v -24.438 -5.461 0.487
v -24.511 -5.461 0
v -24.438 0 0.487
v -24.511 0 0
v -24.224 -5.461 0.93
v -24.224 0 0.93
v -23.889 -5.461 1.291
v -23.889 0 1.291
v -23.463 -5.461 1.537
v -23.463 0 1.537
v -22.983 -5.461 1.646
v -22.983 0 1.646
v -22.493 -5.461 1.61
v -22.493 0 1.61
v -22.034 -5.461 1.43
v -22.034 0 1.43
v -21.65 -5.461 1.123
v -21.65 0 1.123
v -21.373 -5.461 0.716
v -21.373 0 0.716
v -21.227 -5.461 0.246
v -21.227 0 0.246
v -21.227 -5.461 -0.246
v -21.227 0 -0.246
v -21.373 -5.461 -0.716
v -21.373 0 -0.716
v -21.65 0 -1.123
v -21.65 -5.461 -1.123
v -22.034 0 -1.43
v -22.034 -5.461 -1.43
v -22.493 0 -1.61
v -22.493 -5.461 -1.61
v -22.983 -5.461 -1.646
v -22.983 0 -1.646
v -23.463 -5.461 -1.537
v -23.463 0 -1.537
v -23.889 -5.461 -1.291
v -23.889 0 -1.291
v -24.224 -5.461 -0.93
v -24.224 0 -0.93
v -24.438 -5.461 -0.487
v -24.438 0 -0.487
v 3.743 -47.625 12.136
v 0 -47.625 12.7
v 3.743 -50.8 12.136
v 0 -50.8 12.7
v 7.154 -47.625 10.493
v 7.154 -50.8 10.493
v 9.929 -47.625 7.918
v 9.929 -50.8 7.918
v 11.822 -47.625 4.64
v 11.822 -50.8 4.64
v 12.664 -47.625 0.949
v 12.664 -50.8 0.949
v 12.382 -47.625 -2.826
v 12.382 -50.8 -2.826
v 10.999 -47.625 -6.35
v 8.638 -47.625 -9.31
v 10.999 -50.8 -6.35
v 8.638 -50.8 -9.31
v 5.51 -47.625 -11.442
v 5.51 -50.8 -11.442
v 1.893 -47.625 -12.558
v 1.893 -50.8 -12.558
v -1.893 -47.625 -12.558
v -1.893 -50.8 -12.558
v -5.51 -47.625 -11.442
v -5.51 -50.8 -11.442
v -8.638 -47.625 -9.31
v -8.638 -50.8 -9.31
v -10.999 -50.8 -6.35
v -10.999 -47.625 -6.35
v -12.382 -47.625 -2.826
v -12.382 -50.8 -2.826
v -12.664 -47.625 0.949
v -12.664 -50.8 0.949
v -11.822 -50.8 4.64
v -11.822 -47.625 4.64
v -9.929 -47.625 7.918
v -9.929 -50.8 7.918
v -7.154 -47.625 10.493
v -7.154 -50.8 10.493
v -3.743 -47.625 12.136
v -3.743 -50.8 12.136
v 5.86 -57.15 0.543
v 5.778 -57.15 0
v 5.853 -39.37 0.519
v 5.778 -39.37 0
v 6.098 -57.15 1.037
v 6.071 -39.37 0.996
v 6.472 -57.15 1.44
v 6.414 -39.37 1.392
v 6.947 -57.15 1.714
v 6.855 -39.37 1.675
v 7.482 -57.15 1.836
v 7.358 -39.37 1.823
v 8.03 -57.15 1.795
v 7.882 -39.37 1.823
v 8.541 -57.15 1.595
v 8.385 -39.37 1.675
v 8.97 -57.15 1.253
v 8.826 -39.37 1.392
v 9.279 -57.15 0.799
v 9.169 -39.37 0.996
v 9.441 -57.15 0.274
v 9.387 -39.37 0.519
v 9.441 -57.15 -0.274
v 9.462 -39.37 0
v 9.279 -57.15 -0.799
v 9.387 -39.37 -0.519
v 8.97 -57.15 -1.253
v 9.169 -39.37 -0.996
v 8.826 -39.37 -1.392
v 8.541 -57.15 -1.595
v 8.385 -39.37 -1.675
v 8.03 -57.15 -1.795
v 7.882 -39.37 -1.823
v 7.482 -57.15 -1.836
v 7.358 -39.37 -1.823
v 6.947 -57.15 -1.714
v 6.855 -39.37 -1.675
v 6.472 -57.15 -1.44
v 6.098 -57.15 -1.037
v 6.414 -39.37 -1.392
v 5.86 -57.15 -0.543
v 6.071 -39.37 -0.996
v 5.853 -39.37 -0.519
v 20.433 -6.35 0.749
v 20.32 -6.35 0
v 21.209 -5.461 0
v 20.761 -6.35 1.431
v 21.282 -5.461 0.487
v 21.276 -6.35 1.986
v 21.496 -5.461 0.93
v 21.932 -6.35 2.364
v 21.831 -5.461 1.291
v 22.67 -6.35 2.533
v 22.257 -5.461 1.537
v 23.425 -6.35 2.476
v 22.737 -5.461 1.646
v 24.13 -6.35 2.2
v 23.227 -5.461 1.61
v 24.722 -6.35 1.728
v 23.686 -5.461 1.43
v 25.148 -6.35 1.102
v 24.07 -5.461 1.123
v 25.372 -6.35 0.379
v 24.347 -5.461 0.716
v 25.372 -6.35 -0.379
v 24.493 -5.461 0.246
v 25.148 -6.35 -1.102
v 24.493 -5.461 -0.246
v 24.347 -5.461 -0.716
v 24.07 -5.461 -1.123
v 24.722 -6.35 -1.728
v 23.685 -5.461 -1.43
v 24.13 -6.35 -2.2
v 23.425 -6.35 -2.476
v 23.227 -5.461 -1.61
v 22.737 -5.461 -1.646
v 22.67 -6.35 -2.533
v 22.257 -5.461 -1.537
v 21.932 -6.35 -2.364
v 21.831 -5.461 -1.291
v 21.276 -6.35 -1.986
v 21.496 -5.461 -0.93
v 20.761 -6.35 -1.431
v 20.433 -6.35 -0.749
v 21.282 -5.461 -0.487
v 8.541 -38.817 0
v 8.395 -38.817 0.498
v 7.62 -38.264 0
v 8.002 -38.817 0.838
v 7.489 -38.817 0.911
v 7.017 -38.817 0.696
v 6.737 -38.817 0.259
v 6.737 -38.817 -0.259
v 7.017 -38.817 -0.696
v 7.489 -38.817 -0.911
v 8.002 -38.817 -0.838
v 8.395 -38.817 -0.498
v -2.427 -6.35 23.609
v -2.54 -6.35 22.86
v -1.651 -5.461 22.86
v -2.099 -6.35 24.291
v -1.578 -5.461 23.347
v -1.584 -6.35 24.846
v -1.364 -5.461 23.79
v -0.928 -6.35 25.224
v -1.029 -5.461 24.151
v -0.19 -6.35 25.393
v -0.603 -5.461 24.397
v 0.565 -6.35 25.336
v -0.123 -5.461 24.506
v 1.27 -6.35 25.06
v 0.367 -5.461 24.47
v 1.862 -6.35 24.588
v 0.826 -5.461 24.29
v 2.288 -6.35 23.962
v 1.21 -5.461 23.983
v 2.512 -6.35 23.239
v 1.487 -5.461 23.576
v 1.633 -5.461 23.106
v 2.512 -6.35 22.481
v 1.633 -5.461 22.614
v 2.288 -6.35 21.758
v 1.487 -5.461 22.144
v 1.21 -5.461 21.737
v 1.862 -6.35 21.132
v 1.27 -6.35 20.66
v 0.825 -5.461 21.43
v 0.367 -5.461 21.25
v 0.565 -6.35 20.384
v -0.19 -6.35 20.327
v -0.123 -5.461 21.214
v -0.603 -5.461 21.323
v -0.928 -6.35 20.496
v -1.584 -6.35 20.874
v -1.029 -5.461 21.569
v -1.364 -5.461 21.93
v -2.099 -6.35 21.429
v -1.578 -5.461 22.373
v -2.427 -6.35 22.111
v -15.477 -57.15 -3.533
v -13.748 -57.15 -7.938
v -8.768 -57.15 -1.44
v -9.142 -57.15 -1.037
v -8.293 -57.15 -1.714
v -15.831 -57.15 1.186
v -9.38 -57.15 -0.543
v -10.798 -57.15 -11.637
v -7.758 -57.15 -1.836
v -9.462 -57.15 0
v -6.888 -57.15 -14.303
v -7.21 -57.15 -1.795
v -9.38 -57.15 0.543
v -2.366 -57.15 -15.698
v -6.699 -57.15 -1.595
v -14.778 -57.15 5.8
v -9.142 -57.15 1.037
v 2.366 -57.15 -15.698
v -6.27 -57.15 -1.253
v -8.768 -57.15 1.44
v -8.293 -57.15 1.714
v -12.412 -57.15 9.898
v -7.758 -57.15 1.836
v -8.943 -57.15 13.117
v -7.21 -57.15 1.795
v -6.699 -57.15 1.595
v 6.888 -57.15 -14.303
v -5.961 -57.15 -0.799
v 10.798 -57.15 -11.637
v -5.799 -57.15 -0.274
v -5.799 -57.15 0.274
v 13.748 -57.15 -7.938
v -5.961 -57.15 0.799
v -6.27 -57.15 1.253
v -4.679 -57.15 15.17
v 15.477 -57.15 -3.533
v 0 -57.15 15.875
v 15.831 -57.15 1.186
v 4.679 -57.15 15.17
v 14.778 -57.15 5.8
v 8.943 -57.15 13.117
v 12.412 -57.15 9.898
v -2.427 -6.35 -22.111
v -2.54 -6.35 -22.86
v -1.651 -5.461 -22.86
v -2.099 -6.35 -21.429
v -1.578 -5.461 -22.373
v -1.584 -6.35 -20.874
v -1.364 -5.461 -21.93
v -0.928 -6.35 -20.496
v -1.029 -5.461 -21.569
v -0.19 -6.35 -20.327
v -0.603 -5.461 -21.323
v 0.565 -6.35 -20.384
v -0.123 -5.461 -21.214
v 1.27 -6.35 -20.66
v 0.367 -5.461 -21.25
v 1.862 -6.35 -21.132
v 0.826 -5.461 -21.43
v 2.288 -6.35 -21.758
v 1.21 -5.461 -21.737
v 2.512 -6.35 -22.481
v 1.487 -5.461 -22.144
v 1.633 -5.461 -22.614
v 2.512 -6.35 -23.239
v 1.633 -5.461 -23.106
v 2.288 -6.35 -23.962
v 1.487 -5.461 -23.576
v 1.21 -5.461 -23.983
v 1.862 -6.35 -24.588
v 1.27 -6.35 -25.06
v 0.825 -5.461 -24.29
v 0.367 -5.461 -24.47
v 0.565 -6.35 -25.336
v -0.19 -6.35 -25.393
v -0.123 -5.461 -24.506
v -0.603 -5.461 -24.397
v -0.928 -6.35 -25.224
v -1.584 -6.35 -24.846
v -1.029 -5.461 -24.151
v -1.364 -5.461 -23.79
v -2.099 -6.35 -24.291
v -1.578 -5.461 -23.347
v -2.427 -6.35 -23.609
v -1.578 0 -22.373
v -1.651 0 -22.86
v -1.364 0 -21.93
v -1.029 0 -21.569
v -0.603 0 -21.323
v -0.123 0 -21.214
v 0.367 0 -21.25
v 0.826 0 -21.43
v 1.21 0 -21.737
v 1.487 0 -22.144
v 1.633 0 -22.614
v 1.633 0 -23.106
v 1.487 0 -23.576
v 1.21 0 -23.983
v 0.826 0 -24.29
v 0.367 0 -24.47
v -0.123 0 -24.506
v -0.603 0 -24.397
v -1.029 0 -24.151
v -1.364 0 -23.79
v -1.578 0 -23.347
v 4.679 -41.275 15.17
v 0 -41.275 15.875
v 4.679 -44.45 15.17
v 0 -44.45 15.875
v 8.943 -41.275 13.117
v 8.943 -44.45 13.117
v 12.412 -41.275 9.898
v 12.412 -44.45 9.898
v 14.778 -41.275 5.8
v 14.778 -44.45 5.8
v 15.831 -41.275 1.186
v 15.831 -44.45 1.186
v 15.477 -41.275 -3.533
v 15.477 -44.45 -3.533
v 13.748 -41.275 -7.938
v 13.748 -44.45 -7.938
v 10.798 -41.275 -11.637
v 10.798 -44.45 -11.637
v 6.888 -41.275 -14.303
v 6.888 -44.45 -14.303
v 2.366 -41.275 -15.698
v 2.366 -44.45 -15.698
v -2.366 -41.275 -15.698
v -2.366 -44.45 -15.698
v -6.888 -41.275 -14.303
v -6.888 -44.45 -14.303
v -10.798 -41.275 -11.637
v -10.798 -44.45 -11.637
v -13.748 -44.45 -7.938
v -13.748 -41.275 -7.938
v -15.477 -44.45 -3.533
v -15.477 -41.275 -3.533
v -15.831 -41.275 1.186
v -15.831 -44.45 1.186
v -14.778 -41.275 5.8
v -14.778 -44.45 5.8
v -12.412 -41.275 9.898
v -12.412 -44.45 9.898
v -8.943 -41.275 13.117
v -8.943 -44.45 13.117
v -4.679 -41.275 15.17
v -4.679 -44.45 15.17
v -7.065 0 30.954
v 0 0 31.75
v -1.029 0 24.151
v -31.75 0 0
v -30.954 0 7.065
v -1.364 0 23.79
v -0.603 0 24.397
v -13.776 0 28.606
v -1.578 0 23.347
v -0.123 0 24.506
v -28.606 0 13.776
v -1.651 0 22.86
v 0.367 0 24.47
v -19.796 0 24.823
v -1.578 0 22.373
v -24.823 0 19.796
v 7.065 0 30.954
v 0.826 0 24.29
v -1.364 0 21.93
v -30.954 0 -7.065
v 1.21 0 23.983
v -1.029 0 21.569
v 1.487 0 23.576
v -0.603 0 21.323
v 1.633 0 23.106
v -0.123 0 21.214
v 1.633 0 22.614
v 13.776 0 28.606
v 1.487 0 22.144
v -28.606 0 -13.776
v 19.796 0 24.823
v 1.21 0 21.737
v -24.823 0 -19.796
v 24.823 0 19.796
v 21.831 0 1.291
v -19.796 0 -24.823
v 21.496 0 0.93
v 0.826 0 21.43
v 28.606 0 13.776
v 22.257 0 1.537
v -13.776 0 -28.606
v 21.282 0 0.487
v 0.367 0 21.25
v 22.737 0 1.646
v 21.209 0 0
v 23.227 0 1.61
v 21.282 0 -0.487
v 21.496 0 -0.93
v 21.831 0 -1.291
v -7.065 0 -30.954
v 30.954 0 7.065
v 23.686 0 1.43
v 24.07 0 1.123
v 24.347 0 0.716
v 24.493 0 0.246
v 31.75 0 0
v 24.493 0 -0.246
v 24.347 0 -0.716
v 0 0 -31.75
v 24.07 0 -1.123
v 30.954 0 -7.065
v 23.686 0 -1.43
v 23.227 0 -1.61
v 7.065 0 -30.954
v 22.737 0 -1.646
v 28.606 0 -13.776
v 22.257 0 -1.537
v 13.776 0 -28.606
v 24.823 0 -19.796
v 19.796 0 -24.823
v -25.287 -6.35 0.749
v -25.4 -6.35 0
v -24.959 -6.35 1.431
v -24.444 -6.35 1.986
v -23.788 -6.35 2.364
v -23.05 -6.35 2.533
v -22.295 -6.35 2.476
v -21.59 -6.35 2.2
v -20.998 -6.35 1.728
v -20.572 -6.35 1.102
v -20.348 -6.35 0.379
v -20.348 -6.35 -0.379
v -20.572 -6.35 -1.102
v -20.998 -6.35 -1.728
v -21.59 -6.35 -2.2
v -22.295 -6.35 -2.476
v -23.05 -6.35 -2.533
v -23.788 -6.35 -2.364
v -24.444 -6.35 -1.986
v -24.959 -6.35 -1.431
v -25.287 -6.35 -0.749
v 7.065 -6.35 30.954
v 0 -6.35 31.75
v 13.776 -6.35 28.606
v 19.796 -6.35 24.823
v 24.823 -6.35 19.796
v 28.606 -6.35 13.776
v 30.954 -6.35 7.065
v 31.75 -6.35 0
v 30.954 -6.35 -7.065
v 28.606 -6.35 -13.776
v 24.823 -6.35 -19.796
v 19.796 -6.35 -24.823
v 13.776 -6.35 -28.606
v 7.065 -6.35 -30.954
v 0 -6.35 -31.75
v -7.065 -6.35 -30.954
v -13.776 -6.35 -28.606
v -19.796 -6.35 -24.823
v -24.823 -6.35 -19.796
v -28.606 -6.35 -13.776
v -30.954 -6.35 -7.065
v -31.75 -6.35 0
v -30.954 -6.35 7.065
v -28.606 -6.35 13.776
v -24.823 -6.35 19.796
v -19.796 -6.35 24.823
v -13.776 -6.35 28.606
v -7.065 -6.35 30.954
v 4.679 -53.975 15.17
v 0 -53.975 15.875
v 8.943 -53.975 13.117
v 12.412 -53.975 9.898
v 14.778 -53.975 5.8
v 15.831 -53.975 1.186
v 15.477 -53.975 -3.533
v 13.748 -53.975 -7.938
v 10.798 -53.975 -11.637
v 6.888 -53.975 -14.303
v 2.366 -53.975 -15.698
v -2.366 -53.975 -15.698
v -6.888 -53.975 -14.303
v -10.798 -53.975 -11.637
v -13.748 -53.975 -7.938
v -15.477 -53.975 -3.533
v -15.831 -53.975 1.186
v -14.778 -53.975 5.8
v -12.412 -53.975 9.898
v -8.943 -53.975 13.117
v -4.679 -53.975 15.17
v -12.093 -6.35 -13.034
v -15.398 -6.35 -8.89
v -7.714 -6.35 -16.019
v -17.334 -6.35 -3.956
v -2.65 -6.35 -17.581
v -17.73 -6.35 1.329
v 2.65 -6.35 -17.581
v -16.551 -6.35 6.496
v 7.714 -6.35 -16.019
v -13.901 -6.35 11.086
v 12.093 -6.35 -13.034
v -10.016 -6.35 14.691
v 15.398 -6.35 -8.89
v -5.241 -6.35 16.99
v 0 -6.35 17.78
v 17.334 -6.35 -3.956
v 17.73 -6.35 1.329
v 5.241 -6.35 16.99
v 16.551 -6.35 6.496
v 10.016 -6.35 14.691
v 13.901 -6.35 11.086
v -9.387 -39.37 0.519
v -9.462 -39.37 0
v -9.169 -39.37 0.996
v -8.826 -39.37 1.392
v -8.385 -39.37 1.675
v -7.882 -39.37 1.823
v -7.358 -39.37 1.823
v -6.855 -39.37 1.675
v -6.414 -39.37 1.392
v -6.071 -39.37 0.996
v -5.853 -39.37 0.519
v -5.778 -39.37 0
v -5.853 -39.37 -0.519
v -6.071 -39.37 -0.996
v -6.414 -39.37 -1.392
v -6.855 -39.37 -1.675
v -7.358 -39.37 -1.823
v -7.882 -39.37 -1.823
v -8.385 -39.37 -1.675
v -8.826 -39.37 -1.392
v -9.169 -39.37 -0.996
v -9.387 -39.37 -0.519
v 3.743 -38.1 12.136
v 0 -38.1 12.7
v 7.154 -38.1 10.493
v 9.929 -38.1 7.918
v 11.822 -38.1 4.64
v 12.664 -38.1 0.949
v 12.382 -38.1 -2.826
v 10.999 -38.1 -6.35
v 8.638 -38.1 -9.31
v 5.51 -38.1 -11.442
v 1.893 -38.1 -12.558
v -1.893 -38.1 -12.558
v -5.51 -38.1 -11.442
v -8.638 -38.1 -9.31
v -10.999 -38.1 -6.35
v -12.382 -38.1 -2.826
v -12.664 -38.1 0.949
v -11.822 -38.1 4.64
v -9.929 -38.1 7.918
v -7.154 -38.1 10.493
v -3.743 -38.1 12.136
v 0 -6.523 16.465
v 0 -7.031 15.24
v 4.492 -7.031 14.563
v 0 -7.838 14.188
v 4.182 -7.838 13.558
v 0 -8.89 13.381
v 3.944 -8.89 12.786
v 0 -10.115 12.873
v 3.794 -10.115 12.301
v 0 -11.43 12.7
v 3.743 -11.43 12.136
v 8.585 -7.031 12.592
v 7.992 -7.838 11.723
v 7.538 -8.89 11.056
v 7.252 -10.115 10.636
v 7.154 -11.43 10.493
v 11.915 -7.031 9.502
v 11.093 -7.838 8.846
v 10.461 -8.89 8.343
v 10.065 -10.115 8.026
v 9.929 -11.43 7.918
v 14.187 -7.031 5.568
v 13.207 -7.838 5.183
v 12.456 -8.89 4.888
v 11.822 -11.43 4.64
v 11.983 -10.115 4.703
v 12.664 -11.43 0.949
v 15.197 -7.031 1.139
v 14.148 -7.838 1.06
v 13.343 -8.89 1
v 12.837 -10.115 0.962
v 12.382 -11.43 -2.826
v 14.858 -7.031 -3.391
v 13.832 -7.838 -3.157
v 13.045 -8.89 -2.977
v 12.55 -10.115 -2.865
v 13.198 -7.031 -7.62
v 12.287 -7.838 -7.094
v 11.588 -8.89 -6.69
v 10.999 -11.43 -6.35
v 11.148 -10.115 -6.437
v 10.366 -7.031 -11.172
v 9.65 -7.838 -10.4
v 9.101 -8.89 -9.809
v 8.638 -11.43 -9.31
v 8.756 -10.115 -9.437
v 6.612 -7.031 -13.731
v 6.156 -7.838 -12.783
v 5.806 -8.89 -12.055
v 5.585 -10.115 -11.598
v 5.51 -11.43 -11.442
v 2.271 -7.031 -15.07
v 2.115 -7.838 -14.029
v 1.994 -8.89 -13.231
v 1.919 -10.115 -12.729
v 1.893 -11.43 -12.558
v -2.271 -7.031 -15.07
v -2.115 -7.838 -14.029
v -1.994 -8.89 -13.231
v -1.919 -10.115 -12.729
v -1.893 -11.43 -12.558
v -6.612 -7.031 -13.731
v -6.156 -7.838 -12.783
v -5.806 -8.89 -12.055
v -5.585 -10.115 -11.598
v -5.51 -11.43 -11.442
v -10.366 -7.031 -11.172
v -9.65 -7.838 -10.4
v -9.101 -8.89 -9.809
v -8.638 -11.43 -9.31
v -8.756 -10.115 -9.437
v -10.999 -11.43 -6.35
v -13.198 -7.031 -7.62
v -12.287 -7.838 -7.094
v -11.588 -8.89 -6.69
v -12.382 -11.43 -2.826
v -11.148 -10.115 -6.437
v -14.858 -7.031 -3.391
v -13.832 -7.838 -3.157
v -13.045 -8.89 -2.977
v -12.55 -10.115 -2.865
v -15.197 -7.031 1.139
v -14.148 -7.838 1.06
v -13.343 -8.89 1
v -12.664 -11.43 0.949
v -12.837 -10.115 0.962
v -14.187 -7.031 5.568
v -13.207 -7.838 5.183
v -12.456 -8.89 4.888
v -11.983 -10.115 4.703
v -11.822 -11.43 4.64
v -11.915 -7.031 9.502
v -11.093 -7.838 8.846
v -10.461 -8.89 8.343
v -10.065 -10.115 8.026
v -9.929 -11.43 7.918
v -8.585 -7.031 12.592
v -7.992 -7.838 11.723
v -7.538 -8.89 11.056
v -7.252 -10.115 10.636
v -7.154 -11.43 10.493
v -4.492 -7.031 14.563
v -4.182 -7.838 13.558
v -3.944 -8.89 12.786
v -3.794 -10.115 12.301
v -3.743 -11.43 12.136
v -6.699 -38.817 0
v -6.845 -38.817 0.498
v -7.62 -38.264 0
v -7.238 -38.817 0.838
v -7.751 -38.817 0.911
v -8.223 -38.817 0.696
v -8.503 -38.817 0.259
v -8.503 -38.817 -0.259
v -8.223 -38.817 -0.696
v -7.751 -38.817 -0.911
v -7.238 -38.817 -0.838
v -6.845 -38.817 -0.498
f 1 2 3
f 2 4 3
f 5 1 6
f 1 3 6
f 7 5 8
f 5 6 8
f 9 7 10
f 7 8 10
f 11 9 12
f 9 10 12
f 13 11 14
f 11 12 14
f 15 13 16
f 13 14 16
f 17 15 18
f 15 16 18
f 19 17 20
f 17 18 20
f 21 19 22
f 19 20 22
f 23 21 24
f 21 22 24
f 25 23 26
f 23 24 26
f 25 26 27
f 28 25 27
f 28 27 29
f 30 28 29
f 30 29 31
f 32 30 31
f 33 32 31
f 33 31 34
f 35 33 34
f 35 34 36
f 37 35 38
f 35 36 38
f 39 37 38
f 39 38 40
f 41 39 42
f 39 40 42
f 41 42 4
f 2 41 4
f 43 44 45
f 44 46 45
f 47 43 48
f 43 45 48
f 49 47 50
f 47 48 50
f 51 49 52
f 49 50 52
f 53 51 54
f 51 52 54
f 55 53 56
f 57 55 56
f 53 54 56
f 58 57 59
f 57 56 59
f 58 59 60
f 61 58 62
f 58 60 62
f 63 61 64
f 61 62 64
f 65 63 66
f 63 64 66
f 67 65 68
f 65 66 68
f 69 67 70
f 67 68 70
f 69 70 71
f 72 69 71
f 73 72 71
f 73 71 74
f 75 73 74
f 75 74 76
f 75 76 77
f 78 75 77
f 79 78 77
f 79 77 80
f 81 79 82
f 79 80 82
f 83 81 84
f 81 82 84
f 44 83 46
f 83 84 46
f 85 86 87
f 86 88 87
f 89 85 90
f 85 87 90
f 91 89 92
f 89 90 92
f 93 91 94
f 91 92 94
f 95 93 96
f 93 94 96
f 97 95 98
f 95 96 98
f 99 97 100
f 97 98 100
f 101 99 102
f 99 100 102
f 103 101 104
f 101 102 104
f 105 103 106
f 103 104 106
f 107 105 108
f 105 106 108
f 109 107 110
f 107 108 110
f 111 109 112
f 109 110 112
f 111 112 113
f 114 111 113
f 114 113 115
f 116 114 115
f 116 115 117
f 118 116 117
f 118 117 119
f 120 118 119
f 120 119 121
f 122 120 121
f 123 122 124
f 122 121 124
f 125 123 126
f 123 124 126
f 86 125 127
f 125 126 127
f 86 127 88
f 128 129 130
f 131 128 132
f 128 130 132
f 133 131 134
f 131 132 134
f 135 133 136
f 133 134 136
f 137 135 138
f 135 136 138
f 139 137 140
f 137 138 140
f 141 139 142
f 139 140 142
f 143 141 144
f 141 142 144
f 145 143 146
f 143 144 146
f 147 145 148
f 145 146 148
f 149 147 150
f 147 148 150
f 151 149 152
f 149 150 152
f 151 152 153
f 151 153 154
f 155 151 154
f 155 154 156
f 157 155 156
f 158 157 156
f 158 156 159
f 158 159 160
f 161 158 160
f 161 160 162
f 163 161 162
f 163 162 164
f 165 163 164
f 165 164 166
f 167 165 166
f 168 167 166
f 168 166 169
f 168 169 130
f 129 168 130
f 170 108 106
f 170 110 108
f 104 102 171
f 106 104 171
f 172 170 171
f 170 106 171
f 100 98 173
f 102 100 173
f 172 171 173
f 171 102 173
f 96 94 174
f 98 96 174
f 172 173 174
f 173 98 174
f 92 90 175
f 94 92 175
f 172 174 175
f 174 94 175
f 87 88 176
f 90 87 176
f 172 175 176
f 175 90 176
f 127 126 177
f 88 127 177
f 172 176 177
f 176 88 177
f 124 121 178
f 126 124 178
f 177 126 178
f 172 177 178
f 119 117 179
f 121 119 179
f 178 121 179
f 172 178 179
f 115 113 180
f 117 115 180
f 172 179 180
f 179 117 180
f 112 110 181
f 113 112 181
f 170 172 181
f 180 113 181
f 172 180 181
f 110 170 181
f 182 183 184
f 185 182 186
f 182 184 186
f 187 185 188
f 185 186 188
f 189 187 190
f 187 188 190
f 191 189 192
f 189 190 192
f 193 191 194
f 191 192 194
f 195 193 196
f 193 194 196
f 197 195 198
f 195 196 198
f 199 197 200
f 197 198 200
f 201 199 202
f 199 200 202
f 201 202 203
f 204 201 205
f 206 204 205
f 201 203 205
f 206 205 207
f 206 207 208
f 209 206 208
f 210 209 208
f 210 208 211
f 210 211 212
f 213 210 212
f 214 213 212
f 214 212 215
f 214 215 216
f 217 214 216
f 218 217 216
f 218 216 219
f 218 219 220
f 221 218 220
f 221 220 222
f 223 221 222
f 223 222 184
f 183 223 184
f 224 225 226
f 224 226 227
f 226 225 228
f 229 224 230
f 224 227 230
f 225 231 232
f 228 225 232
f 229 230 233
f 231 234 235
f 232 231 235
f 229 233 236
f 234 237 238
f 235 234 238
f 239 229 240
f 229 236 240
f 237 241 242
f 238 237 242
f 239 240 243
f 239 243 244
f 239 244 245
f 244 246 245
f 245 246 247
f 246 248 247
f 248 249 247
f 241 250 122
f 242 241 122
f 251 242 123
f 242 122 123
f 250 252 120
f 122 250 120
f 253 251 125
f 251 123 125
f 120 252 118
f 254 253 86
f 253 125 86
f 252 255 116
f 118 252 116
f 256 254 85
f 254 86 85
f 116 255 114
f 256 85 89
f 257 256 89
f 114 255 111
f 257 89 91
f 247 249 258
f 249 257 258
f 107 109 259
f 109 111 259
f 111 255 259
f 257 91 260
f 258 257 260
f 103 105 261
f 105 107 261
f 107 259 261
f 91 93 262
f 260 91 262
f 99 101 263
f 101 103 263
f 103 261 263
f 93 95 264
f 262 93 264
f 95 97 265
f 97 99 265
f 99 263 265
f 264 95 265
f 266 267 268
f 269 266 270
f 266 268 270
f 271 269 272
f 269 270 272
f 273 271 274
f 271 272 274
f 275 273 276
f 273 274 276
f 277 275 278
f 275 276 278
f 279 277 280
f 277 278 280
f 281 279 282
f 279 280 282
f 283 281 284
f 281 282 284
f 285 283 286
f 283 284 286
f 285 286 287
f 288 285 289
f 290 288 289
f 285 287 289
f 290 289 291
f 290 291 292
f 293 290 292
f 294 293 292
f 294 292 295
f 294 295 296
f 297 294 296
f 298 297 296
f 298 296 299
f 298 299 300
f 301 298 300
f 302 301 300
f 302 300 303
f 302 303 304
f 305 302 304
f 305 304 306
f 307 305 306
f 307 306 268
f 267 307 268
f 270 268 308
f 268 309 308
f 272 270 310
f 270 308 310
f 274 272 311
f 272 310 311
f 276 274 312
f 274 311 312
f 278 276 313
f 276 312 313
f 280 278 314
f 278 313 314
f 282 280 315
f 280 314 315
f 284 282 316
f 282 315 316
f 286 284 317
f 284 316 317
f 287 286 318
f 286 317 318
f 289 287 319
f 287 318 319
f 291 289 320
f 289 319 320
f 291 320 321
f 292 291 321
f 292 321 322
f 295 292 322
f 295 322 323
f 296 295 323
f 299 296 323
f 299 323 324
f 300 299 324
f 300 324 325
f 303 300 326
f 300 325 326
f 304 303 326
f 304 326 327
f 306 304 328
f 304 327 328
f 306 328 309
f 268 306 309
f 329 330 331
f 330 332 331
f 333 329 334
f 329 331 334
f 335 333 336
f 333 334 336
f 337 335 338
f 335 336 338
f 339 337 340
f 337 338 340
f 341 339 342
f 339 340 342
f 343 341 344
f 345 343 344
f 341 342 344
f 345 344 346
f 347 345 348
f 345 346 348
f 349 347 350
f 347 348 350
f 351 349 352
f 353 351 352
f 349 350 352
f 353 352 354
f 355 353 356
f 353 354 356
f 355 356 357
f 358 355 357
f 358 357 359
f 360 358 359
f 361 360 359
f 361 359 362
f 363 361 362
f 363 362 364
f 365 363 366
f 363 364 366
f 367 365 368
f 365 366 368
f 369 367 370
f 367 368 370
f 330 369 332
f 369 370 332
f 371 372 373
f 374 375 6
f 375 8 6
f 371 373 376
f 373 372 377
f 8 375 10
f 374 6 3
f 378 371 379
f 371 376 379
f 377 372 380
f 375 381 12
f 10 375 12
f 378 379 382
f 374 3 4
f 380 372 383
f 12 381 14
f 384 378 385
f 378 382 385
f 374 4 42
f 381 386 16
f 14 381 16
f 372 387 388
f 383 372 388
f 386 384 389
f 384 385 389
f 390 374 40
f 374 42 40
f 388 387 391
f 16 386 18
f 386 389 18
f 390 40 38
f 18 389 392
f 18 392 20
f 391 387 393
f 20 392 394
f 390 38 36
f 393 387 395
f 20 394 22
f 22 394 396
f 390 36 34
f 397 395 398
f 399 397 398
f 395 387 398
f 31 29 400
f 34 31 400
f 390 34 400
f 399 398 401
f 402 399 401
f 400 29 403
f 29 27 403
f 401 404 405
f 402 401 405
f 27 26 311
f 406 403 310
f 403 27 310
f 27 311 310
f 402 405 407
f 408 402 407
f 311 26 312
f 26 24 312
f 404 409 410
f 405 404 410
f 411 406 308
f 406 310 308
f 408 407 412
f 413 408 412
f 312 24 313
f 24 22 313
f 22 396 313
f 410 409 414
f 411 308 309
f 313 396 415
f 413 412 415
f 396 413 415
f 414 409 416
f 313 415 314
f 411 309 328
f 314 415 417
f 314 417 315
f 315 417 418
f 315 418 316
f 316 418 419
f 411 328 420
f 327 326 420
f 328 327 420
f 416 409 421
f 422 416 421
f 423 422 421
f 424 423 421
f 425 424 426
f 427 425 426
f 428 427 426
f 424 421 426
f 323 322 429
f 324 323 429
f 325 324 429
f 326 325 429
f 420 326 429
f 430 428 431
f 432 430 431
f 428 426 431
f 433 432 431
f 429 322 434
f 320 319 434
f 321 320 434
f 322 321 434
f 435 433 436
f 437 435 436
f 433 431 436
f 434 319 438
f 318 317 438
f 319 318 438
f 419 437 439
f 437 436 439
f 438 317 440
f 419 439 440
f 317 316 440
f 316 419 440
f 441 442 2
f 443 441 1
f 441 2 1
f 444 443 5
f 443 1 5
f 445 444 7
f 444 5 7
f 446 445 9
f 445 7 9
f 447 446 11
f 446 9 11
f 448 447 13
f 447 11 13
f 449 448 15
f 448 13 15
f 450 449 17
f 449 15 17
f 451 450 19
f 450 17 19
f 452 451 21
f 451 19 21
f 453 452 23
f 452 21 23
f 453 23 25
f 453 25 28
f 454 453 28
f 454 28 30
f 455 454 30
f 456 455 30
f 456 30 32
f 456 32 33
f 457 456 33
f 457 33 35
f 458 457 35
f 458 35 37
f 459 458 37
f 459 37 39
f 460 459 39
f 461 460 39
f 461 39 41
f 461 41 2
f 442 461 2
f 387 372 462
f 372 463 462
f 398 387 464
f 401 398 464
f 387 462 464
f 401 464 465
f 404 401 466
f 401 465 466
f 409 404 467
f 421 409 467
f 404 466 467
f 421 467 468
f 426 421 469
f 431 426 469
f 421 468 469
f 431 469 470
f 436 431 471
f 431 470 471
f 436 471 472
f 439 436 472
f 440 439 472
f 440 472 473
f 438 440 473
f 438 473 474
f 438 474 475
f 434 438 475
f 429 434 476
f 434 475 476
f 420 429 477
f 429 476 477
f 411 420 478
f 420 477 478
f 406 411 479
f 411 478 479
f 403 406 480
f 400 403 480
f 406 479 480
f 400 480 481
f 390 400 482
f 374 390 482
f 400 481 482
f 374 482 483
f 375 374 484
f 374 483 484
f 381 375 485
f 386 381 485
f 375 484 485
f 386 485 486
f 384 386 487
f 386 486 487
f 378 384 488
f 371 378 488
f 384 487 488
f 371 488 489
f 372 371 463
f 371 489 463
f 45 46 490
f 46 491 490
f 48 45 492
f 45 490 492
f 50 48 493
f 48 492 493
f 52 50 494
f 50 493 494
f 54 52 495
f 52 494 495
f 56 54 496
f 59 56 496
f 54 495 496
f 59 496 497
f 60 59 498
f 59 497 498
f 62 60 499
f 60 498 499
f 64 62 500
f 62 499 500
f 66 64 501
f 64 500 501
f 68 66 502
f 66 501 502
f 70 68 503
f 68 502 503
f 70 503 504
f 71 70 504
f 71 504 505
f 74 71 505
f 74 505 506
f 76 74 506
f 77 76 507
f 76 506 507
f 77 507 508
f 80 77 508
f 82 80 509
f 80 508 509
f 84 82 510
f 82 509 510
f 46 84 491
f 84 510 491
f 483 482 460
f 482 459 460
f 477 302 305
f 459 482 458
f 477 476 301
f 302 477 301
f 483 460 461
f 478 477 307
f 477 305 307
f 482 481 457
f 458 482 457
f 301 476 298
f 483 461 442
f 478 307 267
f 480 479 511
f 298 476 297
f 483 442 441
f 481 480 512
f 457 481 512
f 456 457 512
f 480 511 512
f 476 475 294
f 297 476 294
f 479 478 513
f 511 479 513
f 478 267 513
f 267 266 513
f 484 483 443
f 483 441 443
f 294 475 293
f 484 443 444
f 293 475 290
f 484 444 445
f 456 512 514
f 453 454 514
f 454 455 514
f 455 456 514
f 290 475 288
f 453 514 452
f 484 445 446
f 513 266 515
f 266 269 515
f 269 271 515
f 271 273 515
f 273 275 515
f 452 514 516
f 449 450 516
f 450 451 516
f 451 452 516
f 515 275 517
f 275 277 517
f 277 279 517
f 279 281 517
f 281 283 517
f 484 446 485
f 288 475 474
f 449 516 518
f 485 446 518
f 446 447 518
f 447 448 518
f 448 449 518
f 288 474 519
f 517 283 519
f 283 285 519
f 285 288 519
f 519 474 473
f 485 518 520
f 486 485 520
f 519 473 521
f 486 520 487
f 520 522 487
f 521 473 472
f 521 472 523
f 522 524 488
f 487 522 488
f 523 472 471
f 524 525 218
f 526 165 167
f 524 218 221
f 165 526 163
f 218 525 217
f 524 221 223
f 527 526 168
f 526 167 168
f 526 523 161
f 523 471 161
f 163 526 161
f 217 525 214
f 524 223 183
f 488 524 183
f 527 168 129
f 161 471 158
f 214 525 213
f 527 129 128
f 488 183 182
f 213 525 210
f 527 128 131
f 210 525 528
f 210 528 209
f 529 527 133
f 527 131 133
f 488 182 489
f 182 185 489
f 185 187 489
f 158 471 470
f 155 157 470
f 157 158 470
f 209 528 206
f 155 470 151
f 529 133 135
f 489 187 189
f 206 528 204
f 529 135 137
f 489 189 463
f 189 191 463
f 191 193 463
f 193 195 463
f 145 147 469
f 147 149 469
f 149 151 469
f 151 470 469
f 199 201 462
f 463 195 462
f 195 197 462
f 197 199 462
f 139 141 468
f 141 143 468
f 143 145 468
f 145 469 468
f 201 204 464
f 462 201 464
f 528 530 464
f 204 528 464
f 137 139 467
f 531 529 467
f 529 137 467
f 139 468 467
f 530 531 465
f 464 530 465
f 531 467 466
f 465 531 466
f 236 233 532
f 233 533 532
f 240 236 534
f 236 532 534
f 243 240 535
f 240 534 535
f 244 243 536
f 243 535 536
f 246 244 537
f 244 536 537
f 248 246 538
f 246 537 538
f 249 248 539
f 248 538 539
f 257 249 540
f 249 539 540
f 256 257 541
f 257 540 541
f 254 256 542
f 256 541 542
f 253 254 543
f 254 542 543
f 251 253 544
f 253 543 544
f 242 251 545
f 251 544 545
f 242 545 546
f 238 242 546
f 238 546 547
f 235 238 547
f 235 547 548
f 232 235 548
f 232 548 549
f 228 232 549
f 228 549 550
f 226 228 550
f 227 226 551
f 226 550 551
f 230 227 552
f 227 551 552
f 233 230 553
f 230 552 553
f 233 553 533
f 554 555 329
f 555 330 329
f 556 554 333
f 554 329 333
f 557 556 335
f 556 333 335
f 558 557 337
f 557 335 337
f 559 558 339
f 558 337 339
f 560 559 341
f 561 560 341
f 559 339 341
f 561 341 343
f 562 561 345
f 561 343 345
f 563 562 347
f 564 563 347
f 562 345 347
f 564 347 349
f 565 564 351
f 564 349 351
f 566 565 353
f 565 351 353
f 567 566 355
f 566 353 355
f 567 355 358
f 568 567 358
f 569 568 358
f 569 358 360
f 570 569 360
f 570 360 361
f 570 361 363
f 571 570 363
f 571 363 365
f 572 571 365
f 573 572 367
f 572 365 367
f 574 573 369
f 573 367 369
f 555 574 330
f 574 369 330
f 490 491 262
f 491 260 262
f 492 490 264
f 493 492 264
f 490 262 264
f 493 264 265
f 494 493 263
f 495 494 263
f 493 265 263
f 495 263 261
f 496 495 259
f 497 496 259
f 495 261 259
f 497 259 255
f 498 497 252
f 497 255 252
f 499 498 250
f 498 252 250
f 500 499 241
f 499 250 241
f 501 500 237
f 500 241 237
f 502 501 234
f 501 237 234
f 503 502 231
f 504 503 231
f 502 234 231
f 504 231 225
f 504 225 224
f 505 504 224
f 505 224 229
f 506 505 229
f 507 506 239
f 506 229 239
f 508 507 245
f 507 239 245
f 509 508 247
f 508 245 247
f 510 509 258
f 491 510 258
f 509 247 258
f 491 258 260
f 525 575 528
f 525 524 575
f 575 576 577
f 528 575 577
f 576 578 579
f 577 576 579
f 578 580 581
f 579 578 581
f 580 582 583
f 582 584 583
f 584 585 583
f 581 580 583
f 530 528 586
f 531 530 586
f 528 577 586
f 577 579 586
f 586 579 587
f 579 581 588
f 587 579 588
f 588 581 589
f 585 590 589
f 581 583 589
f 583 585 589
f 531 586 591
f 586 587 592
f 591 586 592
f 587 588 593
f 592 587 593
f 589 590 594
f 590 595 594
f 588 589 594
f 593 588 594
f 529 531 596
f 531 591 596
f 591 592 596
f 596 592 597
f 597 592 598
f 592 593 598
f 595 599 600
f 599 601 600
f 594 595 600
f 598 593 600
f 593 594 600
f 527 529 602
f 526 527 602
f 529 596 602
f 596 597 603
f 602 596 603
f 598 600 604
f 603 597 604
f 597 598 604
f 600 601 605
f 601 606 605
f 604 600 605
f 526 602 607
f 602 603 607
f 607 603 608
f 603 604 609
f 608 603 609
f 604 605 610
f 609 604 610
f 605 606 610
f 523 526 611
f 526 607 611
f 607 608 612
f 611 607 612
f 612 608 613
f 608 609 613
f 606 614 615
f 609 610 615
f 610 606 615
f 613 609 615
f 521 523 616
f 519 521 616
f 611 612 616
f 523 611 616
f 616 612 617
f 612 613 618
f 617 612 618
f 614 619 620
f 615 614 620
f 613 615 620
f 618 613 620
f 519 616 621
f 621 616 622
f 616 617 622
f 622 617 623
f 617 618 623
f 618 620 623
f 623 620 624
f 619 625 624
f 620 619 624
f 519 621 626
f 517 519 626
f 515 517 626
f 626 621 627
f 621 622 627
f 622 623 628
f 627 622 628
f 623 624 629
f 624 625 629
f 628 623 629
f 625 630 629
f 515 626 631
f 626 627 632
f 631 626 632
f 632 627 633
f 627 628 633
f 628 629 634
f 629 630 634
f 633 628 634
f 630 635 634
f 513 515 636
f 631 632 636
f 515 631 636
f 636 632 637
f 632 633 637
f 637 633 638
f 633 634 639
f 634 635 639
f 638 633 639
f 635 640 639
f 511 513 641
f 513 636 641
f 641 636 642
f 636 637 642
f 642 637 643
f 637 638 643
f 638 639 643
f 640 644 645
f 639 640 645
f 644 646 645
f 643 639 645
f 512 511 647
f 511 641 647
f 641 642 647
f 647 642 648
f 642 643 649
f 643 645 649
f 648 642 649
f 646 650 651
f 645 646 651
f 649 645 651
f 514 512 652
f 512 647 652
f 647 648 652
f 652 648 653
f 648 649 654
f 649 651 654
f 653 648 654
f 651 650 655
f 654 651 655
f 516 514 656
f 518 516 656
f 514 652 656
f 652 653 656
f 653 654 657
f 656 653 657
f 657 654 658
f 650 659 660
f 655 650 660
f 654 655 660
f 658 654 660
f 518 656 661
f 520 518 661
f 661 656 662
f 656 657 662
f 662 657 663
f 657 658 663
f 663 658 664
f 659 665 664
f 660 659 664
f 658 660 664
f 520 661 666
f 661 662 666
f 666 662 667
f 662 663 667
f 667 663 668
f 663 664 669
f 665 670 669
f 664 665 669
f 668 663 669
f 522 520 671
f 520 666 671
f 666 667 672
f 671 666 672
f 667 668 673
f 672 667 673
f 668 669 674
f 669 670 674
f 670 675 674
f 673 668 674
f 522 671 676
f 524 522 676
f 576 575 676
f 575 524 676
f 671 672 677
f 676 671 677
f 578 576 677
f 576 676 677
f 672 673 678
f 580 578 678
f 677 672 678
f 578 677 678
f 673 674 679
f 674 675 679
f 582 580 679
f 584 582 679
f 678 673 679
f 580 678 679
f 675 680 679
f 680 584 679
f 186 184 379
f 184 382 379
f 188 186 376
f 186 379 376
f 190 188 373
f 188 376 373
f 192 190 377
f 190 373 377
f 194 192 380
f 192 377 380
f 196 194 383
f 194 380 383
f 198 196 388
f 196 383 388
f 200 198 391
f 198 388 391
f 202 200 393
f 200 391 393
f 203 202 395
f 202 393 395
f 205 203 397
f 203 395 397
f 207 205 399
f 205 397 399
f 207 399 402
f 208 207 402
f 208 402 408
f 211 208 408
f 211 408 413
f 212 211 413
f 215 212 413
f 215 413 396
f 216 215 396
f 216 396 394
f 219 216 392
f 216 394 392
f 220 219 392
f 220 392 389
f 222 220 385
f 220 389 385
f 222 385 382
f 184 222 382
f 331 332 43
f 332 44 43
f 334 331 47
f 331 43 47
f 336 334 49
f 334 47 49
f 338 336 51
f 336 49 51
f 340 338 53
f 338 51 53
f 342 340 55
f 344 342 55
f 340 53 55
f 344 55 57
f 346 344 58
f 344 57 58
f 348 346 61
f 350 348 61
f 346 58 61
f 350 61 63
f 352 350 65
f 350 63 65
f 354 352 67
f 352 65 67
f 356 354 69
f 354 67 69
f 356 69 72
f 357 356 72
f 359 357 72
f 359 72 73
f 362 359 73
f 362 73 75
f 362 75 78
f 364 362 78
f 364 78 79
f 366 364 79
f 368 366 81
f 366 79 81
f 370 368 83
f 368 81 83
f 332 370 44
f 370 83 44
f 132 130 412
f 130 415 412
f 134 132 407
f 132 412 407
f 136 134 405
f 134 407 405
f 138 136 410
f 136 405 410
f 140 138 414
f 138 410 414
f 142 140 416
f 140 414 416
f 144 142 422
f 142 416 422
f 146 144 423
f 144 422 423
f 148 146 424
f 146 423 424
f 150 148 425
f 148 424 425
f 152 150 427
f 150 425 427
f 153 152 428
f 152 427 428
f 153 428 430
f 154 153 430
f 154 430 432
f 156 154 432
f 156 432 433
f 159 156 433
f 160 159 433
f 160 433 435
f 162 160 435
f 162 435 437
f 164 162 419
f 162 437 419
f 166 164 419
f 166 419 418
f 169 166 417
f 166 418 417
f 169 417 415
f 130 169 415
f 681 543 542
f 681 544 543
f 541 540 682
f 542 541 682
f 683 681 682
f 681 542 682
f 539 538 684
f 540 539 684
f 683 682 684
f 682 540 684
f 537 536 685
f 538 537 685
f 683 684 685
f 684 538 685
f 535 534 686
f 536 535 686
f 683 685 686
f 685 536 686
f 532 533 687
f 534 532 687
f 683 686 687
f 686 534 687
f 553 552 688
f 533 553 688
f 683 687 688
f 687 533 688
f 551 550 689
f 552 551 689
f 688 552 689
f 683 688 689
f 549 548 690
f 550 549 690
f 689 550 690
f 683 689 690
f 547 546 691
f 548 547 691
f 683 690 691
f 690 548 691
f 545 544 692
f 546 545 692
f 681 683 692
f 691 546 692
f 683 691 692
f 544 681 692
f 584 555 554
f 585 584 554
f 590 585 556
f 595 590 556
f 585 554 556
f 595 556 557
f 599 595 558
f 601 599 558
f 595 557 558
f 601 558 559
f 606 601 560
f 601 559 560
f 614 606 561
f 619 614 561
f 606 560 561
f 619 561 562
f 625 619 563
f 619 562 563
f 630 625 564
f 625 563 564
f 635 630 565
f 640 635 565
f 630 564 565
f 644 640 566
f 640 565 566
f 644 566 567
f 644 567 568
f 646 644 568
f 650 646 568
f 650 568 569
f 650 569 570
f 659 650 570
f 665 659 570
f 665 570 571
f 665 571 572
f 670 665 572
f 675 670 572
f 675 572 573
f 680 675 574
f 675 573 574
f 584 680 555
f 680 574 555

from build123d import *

# Parameters (mm, degrees)
F3_D           = 3.302
F3_CSINK_D     = 5.08
F3_CSINK_ANGLE = 90
F5_D           = 3.683
F5_DEPTH       = 17.78
F5_TIP         = 1.1064848299
F6_R           = 5.08


with BuildPart() as f1:
    # F0 (on Right) → F1 (revolve)
    with BuildSketch(Plane.YZ):
        Polygon((-57.15, 0), (0, 0), (0, 31.75), (-6.35, 31.75), (-6.35, 12.7), (-38.1, 12.7), (-41.275, 15.875), (-44.45, 15.875), (-47.625, 12.7), (-50.8, 12.7), (-53.975, 15.875), (-57.15, 15.875), align=None)
    revolve(axis=Axis((0, -28.575, 0), (0, 1, 0)))

    # F3 (through all)
    with Locations(Plane.XZ.offset(6.35)):
        with Locations((0, 22.86), (22.86, 0), (0, -22.86), (-22.86, 0)):
            CounterSinkHole(F3_D / 2, F3_CSINK_D / 2, counter_sink_angle=F3_CSINK_ANGLE)

    # F5
    with Locations(Plane.XZ.offset(57.15)):
        with Locations((-7.62, 0), (7.62, 0)):
            Hole(F5_D / 2, depth=F5_DEPTH)
            with Locations((0, 0, -(F5_DEPTH + F5_TIP / 2))):  # 118° drill point
                Cone(0, F5_D / 2, F5_TIP, mode=Mode.SUBTRACT)

    # F6
    f6_edges = [f1.edges().sort_by_distance(p)[0] for p in [
        (0, -6.35, -12.7),
    ]]
    fillet(f6_edges, radius=F6_R)


solid = f1.part
